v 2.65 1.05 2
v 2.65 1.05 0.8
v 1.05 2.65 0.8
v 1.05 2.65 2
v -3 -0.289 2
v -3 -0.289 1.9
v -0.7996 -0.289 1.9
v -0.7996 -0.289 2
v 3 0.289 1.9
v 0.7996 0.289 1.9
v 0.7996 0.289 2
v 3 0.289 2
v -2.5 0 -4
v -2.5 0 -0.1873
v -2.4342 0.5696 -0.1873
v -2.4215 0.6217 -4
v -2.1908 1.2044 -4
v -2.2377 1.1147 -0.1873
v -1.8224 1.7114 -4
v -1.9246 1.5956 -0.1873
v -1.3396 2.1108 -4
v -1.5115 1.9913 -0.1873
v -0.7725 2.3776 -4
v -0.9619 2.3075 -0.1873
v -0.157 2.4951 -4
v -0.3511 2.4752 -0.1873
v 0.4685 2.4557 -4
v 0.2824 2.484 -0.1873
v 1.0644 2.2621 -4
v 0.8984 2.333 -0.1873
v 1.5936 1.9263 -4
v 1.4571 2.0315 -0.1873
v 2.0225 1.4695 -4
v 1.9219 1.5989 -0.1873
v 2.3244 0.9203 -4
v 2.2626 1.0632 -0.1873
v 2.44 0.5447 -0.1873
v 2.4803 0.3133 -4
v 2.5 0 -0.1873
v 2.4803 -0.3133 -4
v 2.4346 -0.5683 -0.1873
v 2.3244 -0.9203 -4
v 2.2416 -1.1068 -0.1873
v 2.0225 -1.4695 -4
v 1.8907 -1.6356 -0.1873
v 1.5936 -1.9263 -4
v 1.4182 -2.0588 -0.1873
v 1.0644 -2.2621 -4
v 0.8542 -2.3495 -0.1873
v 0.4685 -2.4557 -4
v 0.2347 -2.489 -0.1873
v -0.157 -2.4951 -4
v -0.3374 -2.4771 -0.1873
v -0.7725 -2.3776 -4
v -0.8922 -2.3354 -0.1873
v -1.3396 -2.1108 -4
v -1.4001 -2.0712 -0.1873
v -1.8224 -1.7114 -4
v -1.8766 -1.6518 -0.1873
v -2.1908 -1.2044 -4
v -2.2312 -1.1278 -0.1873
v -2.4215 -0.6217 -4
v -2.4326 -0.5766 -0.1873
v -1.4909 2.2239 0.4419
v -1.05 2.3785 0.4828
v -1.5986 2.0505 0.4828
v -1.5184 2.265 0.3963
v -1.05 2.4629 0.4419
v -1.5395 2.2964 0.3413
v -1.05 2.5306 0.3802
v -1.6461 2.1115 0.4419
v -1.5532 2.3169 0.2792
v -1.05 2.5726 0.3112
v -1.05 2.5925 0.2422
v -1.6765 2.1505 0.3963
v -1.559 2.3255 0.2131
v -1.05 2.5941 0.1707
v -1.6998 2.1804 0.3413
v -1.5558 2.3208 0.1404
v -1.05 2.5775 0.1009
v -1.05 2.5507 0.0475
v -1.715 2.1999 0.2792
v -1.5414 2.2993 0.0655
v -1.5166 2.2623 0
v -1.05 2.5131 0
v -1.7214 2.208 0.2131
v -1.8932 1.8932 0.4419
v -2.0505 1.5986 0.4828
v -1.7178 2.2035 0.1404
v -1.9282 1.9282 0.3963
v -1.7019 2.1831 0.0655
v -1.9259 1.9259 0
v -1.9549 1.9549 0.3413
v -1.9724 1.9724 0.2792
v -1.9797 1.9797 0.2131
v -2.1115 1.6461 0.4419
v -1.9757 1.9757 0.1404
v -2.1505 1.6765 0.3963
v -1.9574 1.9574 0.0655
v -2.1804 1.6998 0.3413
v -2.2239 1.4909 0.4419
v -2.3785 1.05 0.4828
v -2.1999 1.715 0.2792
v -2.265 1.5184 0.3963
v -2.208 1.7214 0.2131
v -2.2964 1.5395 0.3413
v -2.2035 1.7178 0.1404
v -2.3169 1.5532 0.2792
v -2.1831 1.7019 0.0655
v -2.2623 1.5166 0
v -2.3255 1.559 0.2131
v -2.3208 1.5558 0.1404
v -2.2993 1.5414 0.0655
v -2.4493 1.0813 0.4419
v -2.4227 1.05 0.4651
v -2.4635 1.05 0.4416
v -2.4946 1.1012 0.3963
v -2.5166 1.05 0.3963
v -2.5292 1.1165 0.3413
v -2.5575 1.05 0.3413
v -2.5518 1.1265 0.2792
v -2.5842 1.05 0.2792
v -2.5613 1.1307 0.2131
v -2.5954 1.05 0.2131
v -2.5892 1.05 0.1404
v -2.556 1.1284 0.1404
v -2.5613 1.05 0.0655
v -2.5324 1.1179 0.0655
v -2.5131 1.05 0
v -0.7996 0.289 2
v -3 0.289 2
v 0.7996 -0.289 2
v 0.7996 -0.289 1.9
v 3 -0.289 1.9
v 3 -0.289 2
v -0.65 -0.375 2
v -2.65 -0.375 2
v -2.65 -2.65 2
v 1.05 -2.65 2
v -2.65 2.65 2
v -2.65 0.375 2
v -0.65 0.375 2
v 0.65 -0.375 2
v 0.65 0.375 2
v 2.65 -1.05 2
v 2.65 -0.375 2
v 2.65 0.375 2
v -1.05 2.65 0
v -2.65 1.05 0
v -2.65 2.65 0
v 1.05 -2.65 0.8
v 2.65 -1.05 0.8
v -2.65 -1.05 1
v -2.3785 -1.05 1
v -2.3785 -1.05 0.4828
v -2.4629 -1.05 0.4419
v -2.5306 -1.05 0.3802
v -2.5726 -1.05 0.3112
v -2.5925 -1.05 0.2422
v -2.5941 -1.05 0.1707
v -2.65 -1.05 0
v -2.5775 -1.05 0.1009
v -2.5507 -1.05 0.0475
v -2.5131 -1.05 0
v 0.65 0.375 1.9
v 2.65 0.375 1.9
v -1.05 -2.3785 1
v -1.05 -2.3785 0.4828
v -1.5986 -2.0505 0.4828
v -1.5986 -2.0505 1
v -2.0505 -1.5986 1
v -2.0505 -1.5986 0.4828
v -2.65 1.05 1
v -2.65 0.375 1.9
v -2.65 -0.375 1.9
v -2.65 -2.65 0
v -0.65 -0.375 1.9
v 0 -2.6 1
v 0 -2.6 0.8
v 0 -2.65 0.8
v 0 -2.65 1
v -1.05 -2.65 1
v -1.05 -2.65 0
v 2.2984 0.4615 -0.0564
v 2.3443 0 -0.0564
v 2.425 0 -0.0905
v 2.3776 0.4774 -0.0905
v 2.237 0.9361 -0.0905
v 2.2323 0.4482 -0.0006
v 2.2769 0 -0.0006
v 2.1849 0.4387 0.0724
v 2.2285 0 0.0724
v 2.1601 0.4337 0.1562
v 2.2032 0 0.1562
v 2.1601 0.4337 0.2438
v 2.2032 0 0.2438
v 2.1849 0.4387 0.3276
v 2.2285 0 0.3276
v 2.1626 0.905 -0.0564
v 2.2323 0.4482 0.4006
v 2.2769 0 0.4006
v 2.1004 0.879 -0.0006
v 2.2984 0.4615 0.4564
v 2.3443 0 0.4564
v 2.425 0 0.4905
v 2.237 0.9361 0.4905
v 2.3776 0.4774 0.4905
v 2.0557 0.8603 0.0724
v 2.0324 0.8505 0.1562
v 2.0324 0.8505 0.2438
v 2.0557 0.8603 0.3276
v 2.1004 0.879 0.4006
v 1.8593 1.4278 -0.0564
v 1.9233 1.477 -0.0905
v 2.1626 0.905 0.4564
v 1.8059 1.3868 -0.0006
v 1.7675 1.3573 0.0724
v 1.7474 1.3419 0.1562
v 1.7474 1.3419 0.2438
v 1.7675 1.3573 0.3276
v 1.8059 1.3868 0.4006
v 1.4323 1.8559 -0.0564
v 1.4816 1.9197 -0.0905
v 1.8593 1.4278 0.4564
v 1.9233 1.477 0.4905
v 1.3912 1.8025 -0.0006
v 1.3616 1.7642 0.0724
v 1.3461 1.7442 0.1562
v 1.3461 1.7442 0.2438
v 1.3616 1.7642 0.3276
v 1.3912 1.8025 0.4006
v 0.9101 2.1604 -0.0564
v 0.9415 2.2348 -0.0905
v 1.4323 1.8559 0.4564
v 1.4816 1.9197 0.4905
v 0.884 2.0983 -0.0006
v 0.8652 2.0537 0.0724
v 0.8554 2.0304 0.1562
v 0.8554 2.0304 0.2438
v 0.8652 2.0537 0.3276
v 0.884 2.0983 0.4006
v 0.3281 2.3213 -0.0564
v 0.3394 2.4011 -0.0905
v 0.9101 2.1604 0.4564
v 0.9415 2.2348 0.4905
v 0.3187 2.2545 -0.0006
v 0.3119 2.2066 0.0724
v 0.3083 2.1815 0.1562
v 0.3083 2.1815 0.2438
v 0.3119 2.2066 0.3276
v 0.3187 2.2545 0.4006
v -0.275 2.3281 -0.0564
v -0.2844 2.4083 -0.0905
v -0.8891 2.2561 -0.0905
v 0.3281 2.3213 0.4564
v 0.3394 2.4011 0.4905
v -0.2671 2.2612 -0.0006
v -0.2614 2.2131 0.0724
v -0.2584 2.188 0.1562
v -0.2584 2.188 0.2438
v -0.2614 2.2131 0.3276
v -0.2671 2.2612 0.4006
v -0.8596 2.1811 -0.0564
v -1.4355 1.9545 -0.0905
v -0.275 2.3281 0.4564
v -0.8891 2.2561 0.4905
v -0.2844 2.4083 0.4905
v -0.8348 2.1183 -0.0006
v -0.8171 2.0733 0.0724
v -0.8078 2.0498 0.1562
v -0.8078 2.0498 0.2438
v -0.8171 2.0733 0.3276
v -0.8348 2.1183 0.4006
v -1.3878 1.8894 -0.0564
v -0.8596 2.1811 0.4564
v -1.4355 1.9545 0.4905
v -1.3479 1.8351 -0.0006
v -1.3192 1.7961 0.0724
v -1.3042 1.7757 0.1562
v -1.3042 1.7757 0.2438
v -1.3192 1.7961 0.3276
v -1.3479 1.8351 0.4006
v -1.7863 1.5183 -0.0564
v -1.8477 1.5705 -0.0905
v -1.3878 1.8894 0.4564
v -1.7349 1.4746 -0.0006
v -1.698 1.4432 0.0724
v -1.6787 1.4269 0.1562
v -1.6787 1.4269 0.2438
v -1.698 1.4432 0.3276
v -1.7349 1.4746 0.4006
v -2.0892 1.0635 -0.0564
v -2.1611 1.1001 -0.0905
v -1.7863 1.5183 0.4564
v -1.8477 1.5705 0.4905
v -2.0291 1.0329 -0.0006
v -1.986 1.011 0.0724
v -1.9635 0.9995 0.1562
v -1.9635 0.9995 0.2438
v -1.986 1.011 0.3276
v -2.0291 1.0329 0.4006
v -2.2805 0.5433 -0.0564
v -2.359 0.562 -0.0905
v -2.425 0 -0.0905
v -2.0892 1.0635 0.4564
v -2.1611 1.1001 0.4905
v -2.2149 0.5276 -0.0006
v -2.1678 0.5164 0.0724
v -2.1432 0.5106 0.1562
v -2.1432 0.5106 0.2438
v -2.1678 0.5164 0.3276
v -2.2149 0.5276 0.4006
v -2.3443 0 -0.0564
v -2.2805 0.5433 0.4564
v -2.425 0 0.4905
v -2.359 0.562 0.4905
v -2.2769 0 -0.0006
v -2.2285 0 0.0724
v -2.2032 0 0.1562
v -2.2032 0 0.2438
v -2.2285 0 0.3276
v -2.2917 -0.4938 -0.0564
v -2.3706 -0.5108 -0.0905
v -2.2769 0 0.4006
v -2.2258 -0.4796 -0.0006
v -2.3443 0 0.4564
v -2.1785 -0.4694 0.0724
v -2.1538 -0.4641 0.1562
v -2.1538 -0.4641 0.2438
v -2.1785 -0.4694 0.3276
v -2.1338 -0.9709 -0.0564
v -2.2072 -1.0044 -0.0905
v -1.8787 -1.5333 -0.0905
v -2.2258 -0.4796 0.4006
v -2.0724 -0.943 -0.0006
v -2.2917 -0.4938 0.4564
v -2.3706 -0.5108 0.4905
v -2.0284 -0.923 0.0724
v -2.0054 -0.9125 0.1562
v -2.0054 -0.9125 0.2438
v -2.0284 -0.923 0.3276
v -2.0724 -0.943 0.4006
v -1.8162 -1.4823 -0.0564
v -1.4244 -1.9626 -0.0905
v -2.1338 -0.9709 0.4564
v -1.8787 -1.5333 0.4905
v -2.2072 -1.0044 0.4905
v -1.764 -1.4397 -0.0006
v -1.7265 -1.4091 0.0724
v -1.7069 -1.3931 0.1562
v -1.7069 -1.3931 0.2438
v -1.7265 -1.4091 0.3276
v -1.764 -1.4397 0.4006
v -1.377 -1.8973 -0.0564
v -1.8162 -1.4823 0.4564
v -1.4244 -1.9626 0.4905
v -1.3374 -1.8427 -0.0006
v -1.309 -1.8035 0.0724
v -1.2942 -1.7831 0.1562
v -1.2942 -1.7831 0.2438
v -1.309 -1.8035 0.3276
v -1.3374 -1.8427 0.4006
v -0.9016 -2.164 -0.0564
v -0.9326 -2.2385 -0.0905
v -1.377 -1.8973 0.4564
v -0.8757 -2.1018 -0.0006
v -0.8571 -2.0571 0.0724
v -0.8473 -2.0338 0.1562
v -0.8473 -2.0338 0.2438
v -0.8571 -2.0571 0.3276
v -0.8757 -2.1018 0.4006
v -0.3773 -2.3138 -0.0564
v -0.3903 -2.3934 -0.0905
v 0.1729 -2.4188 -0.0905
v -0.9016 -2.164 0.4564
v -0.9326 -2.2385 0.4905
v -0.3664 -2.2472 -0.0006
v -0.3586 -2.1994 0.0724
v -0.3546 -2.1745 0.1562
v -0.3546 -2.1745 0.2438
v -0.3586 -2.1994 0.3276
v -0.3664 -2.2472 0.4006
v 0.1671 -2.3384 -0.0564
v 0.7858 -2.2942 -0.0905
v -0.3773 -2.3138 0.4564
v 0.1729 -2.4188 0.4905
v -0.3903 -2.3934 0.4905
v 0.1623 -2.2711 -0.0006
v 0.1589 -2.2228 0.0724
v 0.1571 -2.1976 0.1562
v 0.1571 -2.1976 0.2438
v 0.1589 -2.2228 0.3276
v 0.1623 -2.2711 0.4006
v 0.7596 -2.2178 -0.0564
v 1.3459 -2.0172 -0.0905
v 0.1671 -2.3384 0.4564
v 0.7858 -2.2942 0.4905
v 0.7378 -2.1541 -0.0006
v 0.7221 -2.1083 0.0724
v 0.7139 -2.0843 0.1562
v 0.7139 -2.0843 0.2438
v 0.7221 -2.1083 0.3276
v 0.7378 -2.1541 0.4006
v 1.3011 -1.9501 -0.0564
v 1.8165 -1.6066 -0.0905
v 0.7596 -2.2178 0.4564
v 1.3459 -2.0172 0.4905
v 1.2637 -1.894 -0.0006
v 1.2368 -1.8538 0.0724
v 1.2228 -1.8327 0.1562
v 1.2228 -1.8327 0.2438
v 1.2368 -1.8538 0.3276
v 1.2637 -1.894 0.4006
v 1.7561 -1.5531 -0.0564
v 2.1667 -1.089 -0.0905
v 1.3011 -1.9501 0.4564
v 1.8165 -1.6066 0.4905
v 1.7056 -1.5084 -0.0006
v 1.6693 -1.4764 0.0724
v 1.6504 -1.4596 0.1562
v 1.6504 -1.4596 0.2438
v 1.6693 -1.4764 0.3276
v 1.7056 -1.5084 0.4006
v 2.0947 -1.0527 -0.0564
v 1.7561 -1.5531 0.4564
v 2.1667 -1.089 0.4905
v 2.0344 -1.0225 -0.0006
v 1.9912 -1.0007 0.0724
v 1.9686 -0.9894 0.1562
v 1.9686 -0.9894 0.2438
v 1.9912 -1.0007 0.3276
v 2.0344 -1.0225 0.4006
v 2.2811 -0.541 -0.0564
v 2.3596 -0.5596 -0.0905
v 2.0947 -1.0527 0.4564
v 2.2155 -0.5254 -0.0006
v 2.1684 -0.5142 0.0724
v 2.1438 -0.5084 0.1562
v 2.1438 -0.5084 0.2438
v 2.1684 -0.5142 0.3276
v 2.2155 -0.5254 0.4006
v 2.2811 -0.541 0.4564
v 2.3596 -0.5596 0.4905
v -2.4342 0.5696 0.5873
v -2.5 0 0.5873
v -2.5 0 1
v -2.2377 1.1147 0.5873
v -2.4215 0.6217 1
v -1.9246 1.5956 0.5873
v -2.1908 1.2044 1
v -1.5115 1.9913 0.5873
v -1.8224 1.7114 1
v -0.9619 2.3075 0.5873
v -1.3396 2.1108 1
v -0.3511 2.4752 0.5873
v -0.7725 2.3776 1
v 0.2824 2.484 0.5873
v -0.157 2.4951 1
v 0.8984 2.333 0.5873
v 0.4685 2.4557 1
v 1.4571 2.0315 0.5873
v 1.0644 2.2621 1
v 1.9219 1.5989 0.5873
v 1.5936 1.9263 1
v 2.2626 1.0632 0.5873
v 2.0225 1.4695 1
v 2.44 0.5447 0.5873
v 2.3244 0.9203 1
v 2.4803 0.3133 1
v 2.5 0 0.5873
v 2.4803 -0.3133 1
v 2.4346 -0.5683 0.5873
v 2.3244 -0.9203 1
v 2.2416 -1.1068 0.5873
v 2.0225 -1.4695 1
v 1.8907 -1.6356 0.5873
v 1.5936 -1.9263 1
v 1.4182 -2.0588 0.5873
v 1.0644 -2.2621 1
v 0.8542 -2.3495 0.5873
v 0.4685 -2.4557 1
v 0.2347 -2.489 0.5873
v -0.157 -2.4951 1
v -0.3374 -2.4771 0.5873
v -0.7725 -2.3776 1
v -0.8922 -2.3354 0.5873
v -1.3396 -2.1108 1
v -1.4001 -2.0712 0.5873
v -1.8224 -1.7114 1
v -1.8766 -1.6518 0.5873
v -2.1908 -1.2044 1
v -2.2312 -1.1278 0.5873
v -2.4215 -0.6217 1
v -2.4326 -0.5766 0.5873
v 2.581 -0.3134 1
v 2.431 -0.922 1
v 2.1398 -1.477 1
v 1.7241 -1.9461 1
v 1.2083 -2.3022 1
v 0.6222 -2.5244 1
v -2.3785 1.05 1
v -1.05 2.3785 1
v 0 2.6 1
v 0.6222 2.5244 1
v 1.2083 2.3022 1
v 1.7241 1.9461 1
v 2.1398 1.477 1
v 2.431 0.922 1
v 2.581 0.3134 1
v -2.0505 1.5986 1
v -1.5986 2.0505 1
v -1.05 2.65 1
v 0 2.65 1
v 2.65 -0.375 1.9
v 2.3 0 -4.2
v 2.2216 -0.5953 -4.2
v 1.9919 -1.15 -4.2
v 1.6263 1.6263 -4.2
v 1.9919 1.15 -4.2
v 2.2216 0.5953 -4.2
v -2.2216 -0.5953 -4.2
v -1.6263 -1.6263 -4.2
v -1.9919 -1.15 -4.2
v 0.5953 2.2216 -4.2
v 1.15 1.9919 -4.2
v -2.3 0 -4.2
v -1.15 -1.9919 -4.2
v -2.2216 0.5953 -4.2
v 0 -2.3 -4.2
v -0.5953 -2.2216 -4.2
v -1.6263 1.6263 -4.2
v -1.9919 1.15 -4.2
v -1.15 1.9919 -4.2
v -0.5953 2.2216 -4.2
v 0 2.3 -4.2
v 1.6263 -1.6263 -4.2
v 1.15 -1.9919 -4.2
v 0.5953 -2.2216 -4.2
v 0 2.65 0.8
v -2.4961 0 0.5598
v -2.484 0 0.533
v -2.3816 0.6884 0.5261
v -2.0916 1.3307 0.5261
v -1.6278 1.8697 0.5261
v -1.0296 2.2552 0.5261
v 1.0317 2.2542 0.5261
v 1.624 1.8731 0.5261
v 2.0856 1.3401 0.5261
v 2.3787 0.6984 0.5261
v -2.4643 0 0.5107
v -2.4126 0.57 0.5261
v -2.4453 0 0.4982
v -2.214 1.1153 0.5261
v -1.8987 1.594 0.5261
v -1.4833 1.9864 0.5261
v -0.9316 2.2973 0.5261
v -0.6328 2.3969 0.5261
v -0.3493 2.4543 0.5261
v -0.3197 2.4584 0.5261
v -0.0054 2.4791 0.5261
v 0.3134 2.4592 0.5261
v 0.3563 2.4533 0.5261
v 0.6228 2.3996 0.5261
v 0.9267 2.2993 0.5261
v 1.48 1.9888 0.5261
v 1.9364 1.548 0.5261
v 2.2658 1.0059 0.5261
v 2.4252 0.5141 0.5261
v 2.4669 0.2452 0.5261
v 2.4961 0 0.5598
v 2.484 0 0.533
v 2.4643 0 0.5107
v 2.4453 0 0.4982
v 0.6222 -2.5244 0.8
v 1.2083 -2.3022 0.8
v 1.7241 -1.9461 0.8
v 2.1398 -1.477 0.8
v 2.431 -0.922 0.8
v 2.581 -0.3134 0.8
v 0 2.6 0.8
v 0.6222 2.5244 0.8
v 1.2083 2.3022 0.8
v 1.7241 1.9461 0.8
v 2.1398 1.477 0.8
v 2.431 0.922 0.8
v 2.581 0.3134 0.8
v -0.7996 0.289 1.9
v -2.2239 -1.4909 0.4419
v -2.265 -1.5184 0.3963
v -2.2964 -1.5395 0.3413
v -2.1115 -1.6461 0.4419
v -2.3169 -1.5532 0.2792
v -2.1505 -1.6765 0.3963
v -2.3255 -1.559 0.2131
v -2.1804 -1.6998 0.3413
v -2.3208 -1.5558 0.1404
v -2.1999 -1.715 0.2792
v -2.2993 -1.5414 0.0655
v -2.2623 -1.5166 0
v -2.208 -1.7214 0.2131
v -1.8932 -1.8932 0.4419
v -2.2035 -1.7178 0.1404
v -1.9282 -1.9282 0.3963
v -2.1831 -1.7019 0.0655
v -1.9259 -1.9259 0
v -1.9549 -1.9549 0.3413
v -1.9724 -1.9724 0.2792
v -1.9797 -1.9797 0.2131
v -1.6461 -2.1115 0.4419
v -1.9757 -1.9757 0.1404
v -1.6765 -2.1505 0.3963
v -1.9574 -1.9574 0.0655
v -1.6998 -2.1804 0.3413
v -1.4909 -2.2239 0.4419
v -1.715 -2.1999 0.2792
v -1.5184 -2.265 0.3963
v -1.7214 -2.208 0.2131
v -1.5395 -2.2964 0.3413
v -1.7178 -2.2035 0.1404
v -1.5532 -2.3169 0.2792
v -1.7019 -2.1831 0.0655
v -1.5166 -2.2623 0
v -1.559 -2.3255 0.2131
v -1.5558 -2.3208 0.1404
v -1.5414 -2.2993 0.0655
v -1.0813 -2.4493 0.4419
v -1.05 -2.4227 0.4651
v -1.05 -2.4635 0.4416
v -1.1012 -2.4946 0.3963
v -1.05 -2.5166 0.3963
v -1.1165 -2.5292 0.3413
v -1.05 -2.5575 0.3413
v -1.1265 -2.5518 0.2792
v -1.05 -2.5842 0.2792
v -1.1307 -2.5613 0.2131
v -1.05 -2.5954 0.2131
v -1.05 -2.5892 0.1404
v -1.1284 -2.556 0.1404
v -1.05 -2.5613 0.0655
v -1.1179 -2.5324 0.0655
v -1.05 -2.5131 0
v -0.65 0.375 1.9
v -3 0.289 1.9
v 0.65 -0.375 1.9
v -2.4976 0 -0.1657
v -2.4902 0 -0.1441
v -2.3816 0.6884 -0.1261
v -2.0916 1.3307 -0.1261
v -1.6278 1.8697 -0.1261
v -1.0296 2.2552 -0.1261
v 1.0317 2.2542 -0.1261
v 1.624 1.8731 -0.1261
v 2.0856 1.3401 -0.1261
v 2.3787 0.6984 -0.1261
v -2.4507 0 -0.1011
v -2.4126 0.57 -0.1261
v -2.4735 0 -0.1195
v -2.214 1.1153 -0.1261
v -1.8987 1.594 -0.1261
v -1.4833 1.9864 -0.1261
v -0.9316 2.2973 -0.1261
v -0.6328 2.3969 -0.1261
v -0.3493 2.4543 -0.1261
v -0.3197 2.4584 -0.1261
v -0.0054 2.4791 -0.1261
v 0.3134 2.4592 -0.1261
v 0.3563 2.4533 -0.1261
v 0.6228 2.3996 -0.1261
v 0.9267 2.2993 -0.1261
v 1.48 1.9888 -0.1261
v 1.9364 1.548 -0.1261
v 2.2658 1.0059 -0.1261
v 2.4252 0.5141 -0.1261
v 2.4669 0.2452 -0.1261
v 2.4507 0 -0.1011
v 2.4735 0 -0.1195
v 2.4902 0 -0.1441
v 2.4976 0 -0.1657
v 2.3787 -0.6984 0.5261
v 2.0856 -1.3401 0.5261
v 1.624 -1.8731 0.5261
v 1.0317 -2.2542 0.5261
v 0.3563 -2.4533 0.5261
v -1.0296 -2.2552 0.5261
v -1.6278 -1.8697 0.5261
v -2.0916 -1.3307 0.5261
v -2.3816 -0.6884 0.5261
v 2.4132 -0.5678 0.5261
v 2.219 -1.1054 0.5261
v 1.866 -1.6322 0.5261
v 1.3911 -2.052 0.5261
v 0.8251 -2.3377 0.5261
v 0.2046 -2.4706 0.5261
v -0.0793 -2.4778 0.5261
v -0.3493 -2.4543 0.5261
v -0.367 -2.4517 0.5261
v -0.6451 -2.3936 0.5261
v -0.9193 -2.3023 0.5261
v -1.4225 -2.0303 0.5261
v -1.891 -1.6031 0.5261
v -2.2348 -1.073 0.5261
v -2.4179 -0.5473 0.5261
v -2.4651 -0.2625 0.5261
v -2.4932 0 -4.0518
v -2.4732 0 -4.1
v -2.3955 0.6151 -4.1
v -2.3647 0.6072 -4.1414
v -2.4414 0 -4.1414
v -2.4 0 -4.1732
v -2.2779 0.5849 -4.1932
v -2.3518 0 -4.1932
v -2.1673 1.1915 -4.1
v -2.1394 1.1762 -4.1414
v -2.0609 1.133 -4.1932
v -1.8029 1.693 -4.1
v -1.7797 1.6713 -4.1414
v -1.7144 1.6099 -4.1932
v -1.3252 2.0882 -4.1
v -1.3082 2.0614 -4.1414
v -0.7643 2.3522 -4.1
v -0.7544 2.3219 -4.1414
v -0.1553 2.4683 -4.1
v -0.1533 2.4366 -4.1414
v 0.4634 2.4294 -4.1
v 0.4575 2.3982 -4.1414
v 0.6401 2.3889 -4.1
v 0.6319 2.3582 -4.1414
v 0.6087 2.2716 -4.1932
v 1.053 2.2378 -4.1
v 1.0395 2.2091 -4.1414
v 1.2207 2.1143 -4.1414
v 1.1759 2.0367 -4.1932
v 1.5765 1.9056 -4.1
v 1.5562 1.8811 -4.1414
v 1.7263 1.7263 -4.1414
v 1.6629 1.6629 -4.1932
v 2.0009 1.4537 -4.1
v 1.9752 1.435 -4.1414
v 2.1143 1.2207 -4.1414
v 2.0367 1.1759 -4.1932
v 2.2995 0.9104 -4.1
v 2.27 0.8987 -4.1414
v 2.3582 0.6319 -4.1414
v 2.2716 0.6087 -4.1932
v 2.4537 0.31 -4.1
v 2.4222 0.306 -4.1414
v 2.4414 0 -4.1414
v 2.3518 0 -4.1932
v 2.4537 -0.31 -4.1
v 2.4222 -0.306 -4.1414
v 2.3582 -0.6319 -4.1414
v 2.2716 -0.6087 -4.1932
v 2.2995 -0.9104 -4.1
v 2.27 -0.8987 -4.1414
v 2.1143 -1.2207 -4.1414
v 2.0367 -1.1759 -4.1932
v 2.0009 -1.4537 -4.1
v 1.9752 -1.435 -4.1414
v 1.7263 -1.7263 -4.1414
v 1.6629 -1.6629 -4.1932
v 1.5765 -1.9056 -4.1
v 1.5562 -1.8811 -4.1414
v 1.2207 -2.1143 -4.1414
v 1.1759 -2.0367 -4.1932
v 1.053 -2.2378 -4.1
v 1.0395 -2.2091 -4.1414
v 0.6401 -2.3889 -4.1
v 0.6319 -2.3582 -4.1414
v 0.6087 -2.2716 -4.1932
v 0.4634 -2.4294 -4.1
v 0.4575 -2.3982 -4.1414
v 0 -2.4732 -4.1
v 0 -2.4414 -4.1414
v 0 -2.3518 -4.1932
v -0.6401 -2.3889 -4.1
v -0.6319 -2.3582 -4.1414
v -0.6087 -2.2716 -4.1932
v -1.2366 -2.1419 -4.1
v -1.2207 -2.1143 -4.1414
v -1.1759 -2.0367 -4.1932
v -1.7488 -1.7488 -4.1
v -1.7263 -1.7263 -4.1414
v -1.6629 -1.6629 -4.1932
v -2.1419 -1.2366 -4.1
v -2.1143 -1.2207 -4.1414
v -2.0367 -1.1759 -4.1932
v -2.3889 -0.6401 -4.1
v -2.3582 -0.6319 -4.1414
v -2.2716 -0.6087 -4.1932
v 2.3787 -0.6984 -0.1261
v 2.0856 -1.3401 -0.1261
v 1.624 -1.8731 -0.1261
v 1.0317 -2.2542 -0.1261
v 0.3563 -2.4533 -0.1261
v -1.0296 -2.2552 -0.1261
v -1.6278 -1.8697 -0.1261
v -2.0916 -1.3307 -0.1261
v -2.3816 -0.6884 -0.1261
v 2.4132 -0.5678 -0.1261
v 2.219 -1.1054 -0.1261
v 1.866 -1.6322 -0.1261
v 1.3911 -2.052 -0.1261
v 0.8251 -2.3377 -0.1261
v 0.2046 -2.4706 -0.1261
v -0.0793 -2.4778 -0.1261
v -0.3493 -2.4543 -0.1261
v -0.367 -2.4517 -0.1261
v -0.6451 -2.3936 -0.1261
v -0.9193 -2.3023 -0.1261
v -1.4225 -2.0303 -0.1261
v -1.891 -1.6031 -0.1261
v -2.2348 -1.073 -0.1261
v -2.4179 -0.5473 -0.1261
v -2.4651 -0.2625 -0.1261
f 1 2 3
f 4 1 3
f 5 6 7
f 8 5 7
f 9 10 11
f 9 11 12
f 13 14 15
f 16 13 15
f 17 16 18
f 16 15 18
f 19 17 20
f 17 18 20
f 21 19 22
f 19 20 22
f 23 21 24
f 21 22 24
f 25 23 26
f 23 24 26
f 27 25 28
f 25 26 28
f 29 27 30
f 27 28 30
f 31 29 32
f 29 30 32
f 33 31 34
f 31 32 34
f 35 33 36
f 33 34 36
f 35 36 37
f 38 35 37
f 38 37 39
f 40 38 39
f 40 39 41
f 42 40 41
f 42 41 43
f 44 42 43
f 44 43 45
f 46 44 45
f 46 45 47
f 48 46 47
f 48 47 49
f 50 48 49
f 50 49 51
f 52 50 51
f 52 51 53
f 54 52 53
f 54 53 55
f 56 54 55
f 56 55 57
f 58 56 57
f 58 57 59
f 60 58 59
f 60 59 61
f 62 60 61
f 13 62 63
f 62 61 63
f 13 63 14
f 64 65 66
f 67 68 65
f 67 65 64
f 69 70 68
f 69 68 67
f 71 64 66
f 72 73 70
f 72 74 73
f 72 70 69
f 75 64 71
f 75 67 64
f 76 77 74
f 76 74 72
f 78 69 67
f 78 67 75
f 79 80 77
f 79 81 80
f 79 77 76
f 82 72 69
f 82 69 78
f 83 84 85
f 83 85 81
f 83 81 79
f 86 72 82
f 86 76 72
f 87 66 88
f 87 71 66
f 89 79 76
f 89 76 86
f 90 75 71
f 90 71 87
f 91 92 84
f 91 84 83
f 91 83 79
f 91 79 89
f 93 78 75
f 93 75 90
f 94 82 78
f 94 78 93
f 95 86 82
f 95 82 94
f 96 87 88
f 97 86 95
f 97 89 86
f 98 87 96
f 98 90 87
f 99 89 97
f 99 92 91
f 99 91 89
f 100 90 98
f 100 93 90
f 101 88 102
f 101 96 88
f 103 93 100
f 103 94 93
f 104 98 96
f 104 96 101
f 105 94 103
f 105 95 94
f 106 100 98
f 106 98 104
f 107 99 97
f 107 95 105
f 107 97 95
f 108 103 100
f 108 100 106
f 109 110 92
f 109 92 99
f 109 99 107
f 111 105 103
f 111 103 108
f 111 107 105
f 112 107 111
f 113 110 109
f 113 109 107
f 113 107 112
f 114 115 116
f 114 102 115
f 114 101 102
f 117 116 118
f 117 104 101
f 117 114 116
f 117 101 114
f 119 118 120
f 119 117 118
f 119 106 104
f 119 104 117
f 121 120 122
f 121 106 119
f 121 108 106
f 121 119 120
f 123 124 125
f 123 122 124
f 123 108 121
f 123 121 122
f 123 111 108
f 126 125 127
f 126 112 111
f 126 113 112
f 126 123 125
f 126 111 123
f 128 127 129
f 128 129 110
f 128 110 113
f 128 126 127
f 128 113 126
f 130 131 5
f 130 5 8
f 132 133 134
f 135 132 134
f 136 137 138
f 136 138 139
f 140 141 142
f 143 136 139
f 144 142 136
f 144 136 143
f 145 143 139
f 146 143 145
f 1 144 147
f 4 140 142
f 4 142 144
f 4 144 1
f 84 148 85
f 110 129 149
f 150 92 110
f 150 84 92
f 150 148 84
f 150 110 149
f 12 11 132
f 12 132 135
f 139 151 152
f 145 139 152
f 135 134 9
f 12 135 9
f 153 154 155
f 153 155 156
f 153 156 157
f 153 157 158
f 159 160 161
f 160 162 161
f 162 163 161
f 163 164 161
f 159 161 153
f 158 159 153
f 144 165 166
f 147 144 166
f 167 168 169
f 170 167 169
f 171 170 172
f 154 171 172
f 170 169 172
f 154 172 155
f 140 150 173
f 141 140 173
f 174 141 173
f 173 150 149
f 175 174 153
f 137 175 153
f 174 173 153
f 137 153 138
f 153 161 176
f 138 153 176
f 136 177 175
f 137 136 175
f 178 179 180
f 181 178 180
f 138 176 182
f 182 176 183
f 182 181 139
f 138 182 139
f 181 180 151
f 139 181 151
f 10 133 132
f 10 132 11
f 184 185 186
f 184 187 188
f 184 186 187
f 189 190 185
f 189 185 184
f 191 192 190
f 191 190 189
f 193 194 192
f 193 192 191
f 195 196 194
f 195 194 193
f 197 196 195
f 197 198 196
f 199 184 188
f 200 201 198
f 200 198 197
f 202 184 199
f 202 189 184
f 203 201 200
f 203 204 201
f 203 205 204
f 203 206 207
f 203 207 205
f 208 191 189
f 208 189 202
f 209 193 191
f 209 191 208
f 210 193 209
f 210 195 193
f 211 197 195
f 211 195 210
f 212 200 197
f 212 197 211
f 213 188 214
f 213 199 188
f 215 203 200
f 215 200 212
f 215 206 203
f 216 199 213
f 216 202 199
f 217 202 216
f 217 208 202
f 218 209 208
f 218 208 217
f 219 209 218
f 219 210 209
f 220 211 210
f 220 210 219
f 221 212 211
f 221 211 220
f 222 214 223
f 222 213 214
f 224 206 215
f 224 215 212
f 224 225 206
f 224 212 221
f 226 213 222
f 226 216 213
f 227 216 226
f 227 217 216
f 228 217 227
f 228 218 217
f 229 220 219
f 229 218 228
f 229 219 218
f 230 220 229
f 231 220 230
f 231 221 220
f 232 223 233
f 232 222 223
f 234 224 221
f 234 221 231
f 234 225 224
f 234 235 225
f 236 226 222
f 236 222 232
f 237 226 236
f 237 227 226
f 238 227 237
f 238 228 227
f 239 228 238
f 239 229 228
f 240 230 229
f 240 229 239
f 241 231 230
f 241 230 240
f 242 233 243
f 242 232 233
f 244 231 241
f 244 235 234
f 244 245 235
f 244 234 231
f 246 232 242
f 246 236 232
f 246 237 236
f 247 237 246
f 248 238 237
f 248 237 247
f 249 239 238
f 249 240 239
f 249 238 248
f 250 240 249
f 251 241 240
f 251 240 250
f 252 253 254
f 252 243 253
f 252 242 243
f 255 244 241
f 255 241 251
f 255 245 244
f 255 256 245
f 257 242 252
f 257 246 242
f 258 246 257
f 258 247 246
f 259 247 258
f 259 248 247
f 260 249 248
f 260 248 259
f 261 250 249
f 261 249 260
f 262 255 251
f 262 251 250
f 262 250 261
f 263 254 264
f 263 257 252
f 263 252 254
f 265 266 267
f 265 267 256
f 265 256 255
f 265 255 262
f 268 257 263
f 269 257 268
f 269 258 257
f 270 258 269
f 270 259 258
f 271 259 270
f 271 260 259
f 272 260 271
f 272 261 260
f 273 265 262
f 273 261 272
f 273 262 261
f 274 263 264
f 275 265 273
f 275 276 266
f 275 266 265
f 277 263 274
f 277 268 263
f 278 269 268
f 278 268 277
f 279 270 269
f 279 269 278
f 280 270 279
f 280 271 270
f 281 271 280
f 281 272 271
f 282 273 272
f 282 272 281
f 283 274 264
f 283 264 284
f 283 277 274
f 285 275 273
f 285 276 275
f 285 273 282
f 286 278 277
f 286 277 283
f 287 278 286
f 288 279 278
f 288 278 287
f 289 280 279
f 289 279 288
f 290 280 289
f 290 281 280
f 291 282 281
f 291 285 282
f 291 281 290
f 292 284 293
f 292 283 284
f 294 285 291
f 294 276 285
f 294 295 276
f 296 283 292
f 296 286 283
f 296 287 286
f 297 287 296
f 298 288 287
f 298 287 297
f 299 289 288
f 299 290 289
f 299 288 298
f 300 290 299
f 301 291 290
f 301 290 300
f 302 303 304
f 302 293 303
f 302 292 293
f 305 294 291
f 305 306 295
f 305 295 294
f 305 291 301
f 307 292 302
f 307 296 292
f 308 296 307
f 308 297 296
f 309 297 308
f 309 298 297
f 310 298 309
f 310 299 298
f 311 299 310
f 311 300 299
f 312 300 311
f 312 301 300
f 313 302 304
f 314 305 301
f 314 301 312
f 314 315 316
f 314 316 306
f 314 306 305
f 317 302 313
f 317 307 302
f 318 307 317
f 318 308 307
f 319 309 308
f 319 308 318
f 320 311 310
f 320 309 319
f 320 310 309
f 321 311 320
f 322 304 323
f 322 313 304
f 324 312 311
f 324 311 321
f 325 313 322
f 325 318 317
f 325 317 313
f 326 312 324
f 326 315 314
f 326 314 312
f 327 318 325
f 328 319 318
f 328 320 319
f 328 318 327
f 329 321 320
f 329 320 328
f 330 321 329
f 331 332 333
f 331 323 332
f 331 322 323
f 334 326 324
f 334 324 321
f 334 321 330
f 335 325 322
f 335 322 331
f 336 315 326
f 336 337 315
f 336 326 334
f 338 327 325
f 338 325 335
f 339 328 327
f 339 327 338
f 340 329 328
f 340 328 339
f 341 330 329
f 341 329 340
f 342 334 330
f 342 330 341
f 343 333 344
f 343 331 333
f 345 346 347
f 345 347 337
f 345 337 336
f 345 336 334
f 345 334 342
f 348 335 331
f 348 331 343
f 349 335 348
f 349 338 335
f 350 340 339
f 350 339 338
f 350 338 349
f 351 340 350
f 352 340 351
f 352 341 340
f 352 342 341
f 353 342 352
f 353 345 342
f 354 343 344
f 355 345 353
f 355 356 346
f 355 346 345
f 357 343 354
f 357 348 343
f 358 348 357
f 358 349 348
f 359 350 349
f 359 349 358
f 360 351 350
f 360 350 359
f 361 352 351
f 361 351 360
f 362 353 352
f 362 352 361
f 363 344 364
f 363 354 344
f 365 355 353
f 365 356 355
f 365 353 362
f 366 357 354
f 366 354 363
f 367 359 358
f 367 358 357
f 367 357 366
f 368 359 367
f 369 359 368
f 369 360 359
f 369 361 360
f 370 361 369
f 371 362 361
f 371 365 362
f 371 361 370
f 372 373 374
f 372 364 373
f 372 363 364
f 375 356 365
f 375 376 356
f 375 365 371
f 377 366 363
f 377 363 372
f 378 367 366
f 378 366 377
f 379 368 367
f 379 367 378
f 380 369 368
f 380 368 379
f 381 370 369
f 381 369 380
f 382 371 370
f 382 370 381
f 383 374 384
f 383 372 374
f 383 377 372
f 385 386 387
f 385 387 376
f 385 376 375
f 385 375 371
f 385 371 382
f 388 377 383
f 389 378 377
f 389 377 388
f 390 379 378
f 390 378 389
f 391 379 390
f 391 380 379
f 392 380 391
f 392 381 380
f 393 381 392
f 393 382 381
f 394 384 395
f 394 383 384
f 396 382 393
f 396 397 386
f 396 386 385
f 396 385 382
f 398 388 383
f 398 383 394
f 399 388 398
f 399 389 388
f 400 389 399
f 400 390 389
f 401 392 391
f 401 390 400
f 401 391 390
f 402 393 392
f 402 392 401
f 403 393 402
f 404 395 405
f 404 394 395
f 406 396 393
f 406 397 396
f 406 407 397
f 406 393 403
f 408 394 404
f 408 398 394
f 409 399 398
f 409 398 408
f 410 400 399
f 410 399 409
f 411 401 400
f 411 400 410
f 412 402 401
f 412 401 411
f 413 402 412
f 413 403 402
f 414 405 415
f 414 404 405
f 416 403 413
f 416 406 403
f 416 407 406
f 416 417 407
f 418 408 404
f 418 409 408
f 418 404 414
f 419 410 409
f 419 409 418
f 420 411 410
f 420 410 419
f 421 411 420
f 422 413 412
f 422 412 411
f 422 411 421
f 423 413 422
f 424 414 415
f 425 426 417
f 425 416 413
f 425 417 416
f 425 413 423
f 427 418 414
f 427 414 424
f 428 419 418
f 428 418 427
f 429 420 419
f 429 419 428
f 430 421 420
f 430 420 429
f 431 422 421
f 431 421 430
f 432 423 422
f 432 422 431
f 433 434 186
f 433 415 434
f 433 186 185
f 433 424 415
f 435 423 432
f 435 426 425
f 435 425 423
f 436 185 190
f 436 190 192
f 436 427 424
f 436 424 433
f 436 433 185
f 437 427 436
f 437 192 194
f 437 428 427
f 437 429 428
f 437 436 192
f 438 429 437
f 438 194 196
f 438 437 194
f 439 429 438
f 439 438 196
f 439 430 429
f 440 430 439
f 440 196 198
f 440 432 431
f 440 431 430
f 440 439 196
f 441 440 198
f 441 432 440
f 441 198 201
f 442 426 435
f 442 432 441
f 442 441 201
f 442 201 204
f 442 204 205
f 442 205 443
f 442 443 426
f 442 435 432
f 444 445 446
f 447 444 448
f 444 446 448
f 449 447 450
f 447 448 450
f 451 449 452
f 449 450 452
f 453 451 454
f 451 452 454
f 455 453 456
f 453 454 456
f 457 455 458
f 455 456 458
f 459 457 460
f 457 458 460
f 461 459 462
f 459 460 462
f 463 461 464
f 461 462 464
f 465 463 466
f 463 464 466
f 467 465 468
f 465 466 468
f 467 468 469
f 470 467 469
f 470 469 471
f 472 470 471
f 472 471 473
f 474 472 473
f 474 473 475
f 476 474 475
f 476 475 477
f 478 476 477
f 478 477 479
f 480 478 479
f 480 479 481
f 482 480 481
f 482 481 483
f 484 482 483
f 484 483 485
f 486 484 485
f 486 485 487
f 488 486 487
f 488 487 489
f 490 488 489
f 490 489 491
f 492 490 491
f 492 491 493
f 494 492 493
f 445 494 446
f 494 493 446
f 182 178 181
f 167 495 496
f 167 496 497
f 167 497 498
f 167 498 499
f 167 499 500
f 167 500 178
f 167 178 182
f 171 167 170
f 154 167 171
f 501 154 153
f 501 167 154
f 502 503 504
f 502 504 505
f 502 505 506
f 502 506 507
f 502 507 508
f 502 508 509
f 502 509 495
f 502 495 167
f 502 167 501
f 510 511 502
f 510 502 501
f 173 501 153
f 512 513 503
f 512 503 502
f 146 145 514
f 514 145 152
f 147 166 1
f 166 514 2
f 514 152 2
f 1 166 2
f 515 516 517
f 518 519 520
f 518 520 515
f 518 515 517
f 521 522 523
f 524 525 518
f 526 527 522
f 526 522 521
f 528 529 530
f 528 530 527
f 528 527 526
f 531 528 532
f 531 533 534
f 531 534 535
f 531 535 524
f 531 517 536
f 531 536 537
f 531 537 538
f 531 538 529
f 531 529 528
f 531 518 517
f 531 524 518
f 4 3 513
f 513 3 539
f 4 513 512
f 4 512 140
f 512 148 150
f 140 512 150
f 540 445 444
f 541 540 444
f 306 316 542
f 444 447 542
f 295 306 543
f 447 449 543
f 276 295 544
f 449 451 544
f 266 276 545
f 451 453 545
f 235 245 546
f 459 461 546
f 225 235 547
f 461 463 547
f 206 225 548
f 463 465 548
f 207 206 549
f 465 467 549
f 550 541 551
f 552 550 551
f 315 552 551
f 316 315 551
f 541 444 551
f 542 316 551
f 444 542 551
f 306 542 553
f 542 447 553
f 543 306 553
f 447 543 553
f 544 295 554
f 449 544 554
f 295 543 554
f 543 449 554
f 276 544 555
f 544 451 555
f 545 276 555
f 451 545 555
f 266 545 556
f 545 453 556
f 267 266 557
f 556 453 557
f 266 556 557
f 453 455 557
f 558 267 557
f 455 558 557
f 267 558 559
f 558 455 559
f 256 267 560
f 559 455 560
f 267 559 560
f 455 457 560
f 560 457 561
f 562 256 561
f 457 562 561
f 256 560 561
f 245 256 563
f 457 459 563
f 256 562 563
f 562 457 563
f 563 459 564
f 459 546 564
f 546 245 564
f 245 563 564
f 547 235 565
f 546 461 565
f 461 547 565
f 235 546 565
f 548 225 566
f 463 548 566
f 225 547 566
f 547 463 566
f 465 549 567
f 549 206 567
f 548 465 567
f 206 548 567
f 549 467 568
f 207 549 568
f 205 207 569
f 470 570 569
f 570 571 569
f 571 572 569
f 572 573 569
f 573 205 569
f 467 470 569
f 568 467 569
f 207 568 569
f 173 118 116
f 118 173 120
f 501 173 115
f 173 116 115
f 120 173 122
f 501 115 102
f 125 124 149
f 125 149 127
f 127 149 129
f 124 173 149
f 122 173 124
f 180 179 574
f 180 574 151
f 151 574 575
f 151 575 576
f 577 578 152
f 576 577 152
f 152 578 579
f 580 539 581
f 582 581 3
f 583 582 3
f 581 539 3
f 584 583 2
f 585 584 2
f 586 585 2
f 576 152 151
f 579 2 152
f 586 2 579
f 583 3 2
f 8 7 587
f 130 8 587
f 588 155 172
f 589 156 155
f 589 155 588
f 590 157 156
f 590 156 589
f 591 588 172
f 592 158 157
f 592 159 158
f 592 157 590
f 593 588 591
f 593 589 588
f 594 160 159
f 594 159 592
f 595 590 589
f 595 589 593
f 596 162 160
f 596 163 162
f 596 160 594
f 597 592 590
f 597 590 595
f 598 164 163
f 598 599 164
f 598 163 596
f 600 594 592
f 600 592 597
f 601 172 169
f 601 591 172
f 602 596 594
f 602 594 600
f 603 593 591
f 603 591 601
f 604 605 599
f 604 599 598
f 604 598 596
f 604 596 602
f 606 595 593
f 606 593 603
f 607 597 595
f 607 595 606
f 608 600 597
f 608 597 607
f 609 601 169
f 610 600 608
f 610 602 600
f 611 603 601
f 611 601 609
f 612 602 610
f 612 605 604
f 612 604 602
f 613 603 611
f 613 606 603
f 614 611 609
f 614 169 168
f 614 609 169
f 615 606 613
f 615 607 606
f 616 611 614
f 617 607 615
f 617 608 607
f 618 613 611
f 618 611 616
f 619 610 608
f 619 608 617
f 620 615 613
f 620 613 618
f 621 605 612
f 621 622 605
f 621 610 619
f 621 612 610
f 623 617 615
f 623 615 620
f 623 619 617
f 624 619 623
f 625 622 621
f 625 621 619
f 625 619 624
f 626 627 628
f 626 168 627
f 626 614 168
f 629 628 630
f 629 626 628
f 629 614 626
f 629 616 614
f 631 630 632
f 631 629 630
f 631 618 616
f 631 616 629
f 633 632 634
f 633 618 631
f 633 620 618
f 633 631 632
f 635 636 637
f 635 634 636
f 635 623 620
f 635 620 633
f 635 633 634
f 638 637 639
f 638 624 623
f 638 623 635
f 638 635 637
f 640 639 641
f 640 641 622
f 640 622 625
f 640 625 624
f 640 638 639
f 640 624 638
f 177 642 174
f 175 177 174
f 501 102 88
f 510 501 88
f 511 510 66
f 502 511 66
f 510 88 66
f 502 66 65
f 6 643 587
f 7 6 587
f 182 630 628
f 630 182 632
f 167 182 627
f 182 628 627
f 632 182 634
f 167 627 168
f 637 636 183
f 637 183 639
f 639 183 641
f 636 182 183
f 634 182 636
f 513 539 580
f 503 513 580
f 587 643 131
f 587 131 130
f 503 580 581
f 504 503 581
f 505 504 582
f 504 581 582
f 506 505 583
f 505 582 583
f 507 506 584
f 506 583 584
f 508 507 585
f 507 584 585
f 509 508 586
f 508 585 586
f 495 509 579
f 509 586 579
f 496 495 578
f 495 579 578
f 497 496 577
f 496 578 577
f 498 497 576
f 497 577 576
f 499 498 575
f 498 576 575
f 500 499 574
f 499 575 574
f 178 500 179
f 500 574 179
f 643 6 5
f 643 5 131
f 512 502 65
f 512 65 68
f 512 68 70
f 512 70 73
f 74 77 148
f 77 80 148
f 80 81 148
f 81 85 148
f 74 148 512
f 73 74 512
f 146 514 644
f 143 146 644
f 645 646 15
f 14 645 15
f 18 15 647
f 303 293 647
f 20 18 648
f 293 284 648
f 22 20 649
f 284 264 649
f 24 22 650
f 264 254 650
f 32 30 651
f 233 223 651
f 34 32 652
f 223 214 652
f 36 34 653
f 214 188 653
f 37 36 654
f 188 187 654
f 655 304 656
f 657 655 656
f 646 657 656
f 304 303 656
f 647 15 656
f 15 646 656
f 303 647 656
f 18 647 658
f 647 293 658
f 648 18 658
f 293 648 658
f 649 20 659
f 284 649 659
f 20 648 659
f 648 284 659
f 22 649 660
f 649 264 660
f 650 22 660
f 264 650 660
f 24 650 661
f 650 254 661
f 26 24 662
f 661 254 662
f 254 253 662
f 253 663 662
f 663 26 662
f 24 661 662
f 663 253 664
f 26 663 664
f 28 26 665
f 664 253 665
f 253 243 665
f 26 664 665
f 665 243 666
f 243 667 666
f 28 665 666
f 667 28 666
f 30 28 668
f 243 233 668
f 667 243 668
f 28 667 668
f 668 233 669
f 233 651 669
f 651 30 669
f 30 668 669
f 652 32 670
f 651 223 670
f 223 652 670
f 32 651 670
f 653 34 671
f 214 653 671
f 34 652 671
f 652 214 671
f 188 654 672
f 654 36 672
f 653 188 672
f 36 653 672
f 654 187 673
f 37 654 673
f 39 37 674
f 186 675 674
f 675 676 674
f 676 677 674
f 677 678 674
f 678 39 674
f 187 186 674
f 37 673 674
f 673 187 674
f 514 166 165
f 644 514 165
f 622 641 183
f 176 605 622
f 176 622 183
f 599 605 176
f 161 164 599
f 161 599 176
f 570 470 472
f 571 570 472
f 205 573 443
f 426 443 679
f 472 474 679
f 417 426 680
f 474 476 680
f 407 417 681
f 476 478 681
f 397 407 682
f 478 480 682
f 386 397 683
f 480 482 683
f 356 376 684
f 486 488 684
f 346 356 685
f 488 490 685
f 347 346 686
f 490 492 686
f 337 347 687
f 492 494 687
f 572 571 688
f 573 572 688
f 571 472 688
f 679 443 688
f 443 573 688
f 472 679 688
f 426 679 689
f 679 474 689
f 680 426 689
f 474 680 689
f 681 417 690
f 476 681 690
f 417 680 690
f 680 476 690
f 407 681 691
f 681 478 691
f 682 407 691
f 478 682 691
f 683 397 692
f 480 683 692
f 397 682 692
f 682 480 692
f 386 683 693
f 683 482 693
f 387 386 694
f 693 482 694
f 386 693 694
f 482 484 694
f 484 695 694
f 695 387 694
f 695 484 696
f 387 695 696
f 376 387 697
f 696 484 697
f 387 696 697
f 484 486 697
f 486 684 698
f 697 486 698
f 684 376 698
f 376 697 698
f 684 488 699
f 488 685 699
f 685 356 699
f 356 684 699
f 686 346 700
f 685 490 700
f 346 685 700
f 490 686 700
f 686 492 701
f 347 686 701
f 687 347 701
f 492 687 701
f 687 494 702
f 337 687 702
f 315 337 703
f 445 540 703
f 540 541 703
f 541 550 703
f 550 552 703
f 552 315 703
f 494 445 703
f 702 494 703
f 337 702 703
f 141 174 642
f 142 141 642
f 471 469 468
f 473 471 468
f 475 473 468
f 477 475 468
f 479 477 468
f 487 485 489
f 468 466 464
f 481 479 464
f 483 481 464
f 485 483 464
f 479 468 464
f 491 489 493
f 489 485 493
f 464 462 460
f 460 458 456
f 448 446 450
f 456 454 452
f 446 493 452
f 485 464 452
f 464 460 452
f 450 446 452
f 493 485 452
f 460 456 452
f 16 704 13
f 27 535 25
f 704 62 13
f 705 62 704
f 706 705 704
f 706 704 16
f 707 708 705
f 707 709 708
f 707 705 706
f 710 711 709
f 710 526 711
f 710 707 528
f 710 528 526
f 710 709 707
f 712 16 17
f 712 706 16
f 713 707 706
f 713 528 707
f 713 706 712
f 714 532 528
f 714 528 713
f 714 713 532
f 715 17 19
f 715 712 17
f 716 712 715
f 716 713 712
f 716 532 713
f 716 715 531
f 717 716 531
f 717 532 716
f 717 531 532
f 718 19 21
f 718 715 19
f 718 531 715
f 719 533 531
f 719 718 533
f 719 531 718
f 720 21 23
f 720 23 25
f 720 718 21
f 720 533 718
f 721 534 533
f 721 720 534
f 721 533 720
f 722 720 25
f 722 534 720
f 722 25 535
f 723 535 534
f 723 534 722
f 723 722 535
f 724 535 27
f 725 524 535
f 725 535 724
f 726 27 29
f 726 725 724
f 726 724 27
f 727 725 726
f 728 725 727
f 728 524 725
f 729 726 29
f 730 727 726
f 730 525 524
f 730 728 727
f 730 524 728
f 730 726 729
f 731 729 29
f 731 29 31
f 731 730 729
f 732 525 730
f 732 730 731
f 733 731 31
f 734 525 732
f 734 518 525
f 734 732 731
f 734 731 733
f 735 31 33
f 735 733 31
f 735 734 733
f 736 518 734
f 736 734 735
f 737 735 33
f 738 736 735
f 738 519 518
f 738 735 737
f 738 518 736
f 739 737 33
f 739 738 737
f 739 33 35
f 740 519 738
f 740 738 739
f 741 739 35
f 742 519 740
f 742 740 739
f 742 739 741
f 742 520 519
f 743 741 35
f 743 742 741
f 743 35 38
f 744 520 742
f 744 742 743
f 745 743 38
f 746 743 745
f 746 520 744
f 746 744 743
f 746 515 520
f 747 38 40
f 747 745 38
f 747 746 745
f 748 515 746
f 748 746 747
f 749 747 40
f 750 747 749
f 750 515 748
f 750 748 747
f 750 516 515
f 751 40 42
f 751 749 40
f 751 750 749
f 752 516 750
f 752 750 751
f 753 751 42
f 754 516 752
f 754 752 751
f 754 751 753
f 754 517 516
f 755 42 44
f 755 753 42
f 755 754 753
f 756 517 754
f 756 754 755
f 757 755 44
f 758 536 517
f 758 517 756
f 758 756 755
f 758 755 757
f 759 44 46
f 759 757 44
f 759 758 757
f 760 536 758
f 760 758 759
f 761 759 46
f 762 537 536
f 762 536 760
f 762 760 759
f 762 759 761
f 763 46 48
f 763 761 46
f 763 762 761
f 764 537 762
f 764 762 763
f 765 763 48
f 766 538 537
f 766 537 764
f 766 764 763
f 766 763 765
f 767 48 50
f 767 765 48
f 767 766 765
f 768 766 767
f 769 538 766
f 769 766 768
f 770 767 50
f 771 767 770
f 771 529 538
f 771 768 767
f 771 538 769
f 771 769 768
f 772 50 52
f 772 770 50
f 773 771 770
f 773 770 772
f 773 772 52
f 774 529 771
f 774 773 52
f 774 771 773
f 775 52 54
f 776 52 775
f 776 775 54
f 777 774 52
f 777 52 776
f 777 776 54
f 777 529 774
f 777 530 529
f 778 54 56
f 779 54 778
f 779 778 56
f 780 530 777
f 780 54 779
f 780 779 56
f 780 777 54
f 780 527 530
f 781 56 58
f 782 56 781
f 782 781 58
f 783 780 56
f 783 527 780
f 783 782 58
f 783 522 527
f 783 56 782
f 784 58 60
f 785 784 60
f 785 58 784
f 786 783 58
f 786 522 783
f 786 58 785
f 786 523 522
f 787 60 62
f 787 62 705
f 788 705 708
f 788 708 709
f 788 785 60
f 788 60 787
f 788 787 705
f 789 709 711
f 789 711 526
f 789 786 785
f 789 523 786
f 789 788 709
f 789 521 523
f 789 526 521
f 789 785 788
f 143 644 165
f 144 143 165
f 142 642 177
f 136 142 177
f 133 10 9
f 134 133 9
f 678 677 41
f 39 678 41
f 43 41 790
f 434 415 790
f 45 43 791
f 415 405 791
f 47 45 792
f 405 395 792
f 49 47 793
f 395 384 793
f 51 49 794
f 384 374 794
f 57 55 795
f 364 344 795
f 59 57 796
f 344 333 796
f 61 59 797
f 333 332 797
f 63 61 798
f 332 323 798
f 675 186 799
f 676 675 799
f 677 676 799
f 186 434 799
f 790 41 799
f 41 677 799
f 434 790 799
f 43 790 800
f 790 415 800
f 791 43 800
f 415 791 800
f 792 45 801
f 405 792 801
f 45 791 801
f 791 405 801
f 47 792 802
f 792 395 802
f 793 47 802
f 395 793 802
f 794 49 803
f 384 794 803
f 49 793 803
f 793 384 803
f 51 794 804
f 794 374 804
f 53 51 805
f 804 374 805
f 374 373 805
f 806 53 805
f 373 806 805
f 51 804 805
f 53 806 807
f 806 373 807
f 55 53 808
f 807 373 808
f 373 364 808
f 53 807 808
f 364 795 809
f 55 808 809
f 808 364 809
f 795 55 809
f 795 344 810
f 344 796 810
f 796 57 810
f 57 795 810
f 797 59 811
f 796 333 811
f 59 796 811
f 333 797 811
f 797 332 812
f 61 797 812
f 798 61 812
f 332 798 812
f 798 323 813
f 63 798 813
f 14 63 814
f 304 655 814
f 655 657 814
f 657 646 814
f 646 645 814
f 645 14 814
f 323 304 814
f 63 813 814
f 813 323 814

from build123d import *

# Parameters (mm, degrees)
DODANIE_WYCI_GNI_CIE1_DEPTH   = 2
SZKIC2_W                      = 2
SZKIC2_H                      = 0.75
DODANIE_WYCI_GNI_CIE2_DEPTH   = 1.9
SZKIC3_W                      = 2.200379753
SZKIC3_H                      = 0.577969806
DODANIE_WYCI_GNI_CIE3_DEPTH   = 0.1
DODANIE_WYCI_GNI_CIE3_2_DEPTH = 0.1
WYTNIJ_WYCI_GNI_CIE1_DEPTH    = 1
WYTNIJ_WYCI_GNI_CIE2_DEPTH    = 0.8
SZKIC6_R                      = 2.5
DODANIE_WYCI_GNI_CIE4_DEPTH   = 5.2
ZAOKR_GLENIE1_R               = 0.2
SZKIC9_R                      = 0.3
ZAOKR_GLENIE2_R               = 0.1


with BuildPart() as part:
    # Szkic1 → Dodanie-wyciągnięcie1 (new body)
    with BuildSketch(Plane.XY):
        Polygon((2.65, -1.05), (2.65, -0.375), (0.65, -0.375), (0.65, 0.375), (2.65, 0.375), (2.65, 1.05), (1.05, 2.65), (-2.65, 2.65), (-2.65, 0.375), (-0.65, 0.375), (-0.65, -0.375), (-2.65, -0.375), (-2.65, -2.65), (1.05, -2.65), align=None)
    extrude(amount=DODANIE_WYCI_GNI_CIE1_DEPTH)

    # Szkic2 → Dodanie-wyciągnięcie2 (add)
    with BuildSketch(Plane(origin=(0, 0, 0), x_dir=(-1, 0, 0), z_dir=(0, 0, -1))):
        with Locations((-1.65, 0)):
            Rectangle(SZKIC2_W, SZKIC2_H)
        with Locations((1.65, 0)):
            Rectangle(SZKIC2_W, SZKIC2_H)
    extrude(amount=-DODANIE_WYCI_GNI_CIE2_DEPTH)

    # Szkic4 → Wytnij-wyciągnięcie1 (cut)
    with BuildSketch(Plane(origin=(0, 0, 0), x_dir=(-1, 0, 0), z_dir=(0, 0, -1))):
        with BuildLine():
            Line((1.05, 2.65), (0, 2.65))
            Line((0, 2.65), (0, 2.6))
            ThreePointArc((0, 2.6), (-2.6, 0), (0, -2.6))
            Line((0, -2.6), (0, -2.65))
            Line((0, -2.65), (1.05, -2.65))
            Line((1.05, -2.65), (1.05, -2.378549978))
            ThreePointArc((1.05, -2.378549978), (1.838477631, -1.838477631), (2.378549978, -1.05))
            Line((2.378549978, -1.05), (2.65, -1.05))
            Line((2.65, -1.05), (2.65, 1.05))
            Line((2.65, 1.05), (2.378549978, 1.05))
            ThreePointArc((2.378549978, 1.05), (1.838477631, 1.838477631), (1.05, 2.378549978))
            Line((1.05, 2.378549978), (1.05, 2.65))
        make_face()
    extrude(amount=-WYTNIJ_WYCI_GNI_CIE1_DEPTH, mode=Mode.SUBTRACT)

    # Szkic5 → Wytnij-wyciągnięcie2 (cut)
    with BuildSketch(Plane(origin=(0, 0, 0), x_dir=(-1, 0, 0), z_dir=(0, 0, -1))):
        Polygon((0.494672593, 3.837977015), (0.494672593, -3.940323068), (-3.599169556, -3.326246746), (-6.226051601, 2.132209453), align=None)
    extrude(amount=-WYTNIJ_WYCI_GNI_CIE2_DEPTH, mode=Mode.SUBTRACT)


with BuildPart() as body_2:
    # Szkic3 → Dodanie-wyciągnięcie3 (new body)
    with BuildSketch(Plane.XY.offset(1.9)):
        with Locations((1.899810124, 0)):
            Rectangle(SZKIC3_W, SZKIC3_H)
    extrude(amount=DODANIE_WYCI_GNI_CIE3_DEPTH)


with BuildPart() as body_3:
    # Szkic3 → Dodanie-wyci_gni_cie3 2 (new body)
    with BuildSketch(Plane.XY.offset(1.9)):
        with Locations((-1.899810124, 0)):
            Rectangle(SZKIC3_W, SZKIC3_H)
    extrude(amount=DODANIE_WYCI_GNI_CIE3_2_DEPTH)


with BuildPart() as body_4:
    # Szkic6 → Dodanie-wyciągnięcie4 (new body)
    with BuildSketch(Plane(origin=(0, 0, 1), x_dir=(-1, 0, 0), z_dir=(0, 0, -1))):
        Circle(SZKIC6_R)
    extrude(amount=DODANIE_WYCI_GNI_CIE4_DEPTH)

    # Zaokrąglenie1
    zaokr_glenie1_edges = [body_4.edges().sort_by_distance(p)[0] for p in [
        (2.5, 0, -4.2),
    ]]
    fillet(zaokr_glenie1_edges, radius=ZAOKR_GLENIE1_R)


with BuildPart() as wyci_cie_obr_t1_tool:
    # Szkic9 → Wycięcie-obrót1 (revolve)
    with BuildSketch(Plane(origin=(0, 0, 0), x_dir=(1, 0, 0), z_dir=(0, 1, 0))):
        with Locations((2.5, -0.2)):
            Circle(SZKIC9_R)
    revolve(axis=Axis((0, 0, -4.2), (0, 0, 1)))


with BuildPart() as part_1:
    add(part.part)

    # Wycięcie-obrót1: cut by wyci_cie_obr_t1_tool
    add(wyci_cie_obr_t1_tool.part, mode=Mode.SUBTRACT)


with BuildPart() as body_4_1:
    add(body_4.part)

    # Wycięcie-obrót1: cut by wyci_cie_obr_t1_tool
    add(wyci_cie_obr_t1_tool.part, mode=Mode.SUBTRACT)

    # Zaokrąglenie2
    zaokr_glenie2_edges = [body_4_1.edges().sort_by_distance(p)[0] for p in [
        (0, -2.5, -0.1),
        (0, -2.5, 0.5),
    ]]
    fillet(zaokr_glenie2_edges, radius=ZAOKR_GLENIE2_R)


solid = Compound([body_2.part, body_3.part, part_1.part, body_4_1.part])
